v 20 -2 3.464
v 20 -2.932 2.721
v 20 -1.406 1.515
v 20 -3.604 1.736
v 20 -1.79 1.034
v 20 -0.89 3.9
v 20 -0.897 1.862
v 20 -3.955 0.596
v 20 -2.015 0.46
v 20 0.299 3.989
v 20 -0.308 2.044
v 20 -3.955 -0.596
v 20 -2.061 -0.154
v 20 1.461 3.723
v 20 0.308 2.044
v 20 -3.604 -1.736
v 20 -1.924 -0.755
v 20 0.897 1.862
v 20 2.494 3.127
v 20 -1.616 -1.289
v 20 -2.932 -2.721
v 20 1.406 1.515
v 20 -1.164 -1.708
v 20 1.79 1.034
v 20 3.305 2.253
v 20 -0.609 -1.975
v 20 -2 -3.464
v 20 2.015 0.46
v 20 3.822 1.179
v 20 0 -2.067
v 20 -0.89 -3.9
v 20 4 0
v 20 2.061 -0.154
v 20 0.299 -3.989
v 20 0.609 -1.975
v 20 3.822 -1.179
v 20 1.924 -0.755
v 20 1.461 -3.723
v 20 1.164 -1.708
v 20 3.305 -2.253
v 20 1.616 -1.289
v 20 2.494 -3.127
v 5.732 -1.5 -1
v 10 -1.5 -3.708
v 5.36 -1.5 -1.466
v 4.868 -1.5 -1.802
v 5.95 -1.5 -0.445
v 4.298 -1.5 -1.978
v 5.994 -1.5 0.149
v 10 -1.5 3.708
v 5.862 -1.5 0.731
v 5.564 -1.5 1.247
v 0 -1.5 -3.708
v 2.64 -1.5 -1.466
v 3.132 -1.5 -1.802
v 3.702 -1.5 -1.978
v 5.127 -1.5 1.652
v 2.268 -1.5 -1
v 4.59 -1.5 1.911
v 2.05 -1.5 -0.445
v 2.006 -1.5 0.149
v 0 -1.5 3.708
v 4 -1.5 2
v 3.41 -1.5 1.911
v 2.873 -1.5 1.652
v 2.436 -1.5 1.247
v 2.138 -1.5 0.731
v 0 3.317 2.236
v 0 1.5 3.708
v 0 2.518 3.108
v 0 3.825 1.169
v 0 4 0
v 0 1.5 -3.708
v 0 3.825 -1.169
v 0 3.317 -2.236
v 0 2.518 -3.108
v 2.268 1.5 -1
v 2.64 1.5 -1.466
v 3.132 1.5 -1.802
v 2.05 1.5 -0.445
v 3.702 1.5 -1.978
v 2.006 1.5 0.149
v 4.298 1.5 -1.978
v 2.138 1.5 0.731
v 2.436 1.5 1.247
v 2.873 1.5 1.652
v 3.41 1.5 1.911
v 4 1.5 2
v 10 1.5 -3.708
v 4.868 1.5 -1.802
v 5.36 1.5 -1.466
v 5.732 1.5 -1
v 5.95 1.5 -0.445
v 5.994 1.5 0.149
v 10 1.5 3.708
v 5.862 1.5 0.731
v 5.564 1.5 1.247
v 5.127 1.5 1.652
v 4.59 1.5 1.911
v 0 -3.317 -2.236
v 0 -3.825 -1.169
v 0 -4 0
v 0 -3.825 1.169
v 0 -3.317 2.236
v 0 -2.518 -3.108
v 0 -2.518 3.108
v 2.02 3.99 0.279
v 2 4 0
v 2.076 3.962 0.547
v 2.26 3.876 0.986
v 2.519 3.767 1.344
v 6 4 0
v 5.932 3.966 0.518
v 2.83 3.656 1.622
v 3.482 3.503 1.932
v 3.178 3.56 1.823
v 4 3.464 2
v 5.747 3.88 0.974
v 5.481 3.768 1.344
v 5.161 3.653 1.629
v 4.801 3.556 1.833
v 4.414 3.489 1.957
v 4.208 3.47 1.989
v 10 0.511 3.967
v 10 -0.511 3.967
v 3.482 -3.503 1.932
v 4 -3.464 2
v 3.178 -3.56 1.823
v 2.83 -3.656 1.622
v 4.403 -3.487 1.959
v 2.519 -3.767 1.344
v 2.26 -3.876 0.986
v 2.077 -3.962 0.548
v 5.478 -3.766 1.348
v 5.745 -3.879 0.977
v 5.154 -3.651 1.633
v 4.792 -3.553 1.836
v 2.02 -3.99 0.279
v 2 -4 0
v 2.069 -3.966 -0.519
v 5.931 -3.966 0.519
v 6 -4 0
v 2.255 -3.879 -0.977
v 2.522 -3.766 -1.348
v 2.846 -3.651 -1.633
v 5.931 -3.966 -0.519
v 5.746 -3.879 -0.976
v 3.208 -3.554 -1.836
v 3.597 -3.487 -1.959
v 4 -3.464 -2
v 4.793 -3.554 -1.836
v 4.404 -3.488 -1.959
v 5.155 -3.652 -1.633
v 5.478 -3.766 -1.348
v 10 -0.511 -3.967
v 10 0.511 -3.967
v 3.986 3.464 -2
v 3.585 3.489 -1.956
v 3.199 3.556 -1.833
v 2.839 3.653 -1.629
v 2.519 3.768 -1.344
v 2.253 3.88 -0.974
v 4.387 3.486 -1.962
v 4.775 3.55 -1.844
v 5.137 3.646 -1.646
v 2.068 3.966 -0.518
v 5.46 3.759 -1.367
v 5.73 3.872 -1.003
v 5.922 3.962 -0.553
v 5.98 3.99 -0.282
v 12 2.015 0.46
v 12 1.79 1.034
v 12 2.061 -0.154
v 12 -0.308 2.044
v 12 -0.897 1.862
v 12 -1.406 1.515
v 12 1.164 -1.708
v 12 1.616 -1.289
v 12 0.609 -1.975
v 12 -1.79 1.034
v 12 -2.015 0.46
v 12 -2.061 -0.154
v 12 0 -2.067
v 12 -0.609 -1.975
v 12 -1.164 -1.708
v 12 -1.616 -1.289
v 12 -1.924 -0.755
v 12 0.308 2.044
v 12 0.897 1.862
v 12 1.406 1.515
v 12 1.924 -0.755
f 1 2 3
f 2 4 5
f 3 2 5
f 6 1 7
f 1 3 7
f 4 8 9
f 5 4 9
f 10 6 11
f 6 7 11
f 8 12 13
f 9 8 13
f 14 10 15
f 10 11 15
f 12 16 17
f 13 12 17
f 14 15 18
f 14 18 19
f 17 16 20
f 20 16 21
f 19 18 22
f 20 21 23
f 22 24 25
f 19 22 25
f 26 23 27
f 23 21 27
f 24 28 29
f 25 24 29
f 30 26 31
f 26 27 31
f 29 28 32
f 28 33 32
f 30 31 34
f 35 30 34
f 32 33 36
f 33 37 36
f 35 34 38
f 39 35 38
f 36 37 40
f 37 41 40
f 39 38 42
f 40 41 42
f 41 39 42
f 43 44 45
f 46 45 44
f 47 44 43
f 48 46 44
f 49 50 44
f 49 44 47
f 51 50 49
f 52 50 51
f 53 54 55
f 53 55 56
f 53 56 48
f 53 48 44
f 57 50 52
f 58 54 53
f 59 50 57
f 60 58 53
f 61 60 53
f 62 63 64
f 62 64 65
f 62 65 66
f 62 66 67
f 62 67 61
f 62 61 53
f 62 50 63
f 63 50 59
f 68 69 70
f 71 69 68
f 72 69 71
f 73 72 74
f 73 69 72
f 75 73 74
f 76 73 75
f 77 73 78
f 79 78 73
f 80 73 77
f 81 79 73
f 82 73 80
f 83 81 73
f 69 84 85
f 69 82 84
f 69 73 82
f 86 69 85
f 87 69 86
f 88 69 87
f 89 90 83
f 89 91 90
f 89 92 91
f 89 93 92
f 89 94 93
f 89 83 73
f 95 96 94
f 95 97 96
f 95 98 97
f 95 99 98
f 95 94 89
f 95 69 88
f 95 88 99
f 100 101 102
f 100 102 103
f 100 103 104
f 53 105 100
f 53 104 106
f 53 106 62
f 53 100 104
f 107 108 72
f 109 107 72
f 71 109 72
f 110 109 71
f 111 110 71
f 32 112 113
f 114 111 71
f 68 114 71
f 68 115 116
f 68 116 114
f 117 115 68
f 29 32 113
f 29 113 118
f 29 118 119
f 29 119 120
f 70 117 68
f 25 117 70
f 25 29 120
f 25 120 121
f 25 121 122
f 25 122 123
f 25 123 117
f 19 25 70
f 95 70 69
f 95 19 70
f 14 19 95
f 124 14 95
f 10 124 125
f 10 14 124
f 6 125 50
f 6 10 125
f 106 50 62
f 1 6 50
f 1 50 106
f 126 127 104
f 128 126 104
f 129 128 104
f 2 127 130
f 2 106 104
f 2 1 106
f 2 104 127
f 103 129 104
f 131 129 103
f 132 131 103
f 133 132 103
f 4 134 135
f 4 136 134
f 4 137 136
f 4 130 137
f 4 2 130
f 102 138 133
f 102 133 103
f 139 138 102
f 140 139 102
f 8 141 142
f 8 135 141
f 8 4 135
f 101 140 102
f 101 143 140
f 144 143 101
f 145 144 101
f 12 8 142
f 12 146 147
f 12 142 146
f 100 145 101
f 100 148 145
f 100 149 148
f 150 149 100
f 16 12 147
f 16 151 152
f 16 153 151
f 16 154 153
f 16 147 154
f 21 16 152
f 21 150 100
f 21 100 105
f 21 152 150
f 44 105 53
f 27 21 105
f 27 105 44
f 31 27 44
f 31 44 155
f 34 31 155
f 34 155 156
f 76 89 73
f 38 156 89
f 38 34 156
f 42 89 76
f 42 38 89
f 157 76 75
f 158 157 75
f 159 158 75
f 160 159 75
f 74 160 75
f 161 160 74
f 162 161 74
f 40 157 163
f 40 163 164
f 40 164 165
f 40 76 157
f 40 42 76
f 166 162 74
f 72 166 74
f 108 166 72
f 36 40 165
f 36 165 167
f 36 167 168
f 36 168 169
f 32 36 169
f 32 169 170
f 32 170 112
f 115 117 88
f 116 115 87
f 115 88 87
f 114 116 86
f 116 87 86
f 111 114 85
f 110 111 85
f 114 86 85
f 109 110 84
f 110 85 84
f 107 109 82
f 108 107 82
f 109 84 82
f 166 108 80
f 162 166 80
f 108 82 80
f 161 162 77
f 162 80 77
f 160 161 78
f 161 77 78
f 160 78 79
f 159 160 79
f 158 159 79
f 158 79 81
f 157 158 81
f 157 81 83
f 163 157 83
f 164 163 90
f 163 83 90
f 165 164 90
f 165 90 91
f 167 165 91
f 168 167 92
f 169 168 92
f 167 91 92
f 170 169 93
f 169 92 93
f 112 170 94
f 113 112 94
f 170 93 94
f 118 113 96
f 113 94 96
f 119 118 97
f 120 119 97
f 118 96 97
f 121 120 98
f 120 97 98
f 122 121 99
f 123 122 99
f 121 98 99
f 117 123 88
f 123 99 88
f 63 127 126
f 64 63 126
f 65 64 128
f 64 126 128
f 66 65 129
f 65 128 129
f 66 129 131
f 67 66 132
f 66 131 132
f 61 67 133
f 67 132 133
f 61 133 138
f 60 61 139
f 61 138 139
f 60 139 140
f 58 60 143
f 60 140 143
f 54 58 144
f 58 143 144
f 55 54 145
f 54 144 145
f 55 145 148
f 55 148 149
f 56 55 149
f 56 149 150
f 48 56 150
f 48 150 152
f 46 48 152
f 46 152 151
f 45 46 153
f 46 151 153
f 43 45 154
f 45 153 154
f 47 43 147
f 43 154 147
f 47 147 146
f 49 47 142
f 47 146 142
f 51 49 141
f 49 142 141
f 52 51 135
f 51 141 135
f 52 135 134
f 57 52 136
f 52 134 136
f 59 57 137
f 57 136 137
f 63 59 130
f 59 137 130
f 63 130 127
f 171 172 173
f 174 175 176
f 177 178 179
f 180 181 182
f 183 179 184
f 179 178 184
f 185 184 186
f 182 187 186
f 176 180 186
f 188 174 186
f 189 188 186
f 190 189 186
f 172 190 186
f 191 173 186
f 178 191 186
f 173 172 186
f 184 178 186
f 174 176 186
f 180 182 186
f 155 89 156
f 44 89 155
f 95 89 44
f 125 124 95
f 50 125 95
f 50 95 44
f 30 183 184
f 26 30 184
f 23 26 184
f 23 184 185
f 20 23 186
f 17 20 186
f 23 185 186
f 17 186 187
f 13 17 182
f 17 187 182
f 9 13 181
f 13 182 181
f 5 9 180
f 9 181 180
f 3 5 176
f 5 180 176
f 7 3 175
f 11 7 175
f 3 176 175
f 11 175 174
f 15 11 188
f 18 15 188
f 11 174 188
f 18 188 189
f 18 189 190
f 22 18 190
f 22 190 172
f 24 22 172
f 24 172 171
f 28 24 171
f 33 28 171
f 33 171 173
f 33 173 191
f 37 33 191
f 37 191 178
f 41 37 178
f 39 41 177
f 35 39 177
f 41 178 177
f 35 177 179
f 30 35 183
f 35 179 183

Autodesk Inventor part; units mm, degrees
ref_plane "YZ Plane" through (0, 0, 0) normal (1, 0, 0) x (0, 1, 0)
sketch "Sketch1" plane through (0, 0, 0) normal (0, 0, 1) x (1, 0, 0)
  line L0 (0, 0) -> (0, 4)
  line L1 (0, 4) -> (20, 4)
  line L2 (20, 4) -> (20, 0)
  line L3 (20, 0) -> (0, 0)
  dimension "d0" = 8
  dimension "d1" = 20
revolve "Revolution1" add sketch "Sketch1" angle 360 about axis through (20, 0, 0) along (-1, 0, 0)
ref_plane "Work Plane1" through (0, 0, 4) normal (0, 0, 1) x (1, 0, 0)
ref_plane "Work Plane3" through (0, 4, 0) normal (0, 1, 0) x (-1, 0, 0)
sketch "Sketch2" plane through (0, 0, 4) normal (0, 0, 1) x (1, 0, 0)
  line L0 (0, 4) -> (0, -4) projected
  line L1 (20, 4) -> (20, -4) projected
  line L2 (20, 4) -> (0, 4) projected
  line L3 (20, -4) -> (0, -4) projected
  line L4 (0, 1.5) -> (10, 1.5)
  line L5 (10, 1.5) -> (10, -1.5)
  line L6 (10, -1.5) -> (0, -1.5)
  line L7 (0, -1.5) -> (0, 1.5)
  point P0 (0, 0)
  point P1 (10, 0)
  point P2 (0, 0)
  point P3 (0, -1.5)
  dimension "d4" = 10
  dimension "d5" = 3
extrude "Extrusion1" cut sketch "Sketch2" against normal blind 8 contours L4 L5 L6 L0
sketch "Sketch4" plane through (0, 4, 0) normal (0, 1, 0) x (-1, 0, 0)
  line L0 (0, -3.7081) -> (0, 3.7081) projected
  line L1 (-20, -4) -> (-20, 4) projected
  point P0 (0, 0)
  point P1 (-4, 0)
  point P2 (0, 0)
  dimension "d18" = 16
hole "Hole2" at (4, 4, 0) direction (0, -1, 0) diameter 4 depth 8
sketch "Sketch5" plane through (20, 0, 0) normal (1, 0, 0) x (0, 0, -1)
  circle A0 centre (0, 0) radius 4 projected
hole "Hole3" at (20, 0, 0) direction (-1, 0, 0) diameter 4.134 depth 8 thread size "M5x0.8" class "6H" standard "ISO Metric profile"
properties part number "17"
